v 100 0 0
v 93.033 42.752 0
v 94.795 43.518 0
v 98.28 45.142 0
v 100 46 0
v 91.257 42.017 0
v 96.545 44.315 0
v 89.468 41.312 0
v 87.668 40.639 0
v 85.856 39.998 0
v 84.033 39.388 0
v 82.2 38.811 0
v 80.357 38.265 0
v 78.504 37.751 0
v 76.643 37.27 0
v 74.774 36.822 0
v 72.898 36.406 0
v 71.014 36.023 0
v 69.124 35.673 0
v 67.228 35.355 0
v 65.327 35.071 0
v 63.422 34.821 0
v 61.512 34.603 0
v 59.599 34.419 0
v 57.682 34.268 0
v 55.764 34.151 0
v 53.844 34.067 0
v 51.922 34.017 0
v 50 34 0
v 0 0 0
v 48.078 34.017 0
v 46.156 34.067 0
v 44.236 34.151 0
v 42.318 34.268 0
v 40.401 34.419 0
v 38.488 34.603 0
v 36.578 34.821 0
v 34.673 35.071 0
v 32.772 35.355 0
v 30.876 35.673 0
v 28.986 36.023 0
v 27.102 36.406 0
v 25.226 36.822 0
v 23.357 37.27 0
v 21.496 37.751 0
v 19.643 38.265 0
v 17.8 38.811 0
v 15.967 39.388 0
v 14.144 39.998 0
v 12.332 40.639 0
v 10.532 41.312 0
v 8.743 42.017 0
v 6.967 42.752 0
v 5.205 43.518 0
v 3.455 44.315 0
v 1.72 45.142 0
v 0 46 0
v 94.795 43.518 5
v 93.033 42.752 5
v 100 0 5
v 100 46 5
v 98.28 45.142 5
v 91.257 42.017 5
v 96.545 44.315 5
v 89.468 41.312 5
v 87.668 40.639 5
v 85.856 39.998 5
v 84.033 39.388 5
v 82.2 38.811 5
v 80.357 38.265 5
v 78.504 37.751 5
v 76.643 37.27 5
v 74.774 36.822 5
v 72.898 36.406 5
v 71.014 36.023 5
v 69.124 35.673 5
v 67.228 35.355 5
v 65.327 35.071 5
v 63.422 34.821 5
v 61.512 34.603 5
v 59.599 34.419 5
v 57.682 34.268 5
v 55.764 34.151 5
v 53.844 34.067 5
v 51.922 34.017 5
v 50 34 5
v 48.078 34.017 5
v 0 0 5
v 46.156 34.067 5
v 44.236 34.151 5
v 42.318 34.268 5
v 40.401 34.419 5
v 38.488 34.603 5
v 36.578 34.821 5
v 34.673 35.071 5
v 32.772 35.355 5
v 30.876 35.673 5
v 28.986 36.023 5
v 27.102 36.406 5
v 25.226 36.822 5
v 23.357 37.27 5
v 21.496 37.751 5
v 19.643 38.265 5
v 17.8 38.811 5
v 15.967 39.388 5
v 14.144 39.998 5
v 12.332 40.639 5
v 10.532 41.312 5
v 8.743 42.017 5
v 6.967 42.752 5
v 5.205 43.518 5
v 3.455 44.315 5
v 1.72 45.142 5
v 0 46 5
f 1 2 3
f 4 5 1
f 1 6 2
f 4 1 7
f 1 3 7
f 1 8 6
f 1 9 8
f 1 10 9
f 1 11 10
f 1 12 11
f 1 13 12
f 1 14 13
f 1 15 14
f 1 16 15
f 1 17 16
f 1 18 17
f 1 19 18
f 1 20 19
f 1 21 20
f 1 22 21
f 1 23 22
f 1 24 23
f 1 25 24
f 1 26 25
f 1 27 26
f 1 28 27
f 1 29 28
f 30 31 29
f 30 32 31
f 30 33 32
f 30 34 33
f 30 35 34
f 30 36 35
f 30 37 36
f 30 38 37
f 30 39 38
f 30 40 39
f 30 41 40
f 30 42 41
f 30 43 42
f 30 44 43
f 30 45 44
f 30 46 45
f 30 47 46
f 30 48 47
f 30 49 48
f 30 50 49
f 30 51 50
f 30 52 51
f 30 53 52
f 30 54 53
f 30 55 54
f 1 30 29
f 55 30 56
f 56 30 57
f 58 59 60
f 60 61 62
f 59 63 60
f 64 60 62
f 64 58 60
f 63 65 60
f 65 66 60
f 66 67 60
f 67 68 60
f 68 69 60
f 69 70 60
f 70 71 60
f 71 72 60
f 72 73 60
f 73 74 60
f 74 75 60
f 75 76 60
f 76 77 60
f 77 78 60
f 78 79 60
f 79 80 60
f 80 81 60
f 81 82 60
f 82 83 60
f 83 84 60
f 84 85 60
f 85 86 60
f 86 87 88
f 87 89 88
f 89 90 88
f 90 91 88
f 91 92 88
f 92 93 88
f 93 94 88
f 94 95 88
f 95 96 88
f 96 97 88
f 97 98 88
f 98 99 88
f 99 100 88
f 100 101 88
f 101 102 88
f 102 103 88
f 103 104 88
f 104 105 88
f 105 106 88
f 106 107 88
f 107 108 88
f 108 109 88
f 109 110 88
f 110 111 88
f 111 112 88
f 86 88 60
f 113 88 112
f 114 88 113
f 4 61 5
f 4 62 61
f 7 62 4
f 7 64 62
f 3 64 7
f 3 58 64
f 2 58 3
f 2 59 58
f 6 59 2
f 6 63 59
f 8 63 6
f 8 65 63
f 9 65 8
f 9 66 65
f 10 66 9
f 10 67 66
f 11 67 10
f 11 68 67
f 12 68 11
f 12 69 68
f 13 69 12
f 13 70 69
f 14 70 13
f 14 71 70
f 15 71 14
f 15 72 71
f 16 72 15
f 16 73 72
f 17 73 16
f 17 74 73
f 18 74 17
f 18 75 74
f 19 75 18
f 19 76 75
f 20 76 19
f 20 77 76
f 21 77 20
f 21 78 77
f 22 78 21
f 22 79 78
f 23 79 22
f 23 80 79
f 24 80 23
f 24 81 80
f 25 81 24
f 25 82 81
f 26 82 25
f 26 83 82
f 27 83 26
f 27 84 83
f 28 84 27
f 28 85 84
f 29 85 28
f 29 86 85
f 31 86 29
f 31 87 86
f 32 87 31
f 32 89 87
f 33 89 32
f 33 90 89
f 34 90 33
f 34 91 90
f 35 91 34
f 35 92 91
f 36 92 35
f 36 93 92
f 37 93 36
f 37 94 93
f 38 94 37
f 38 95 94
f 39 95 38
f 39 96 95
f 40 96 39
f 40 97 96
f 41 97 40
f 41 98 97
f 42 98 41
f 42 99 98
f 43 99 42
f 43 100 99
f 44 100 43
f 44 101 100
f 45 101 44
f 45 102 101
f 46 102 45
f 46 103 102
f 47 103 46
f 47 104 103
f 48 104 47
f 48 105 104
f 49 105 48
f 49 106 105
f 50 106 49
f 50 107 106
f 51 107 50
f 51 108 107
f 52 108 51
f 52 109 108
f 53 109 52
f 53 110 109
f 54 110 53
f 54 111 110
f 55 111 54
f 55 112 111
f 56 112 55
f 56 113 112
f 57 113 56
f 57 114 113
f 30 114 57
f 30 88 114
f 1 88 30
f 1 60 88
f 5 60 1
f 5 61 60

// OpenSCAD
$fn = 32;

// ----------------------------------------------------------------------
// Arc profile plate: notch, 57 points
// ----------------------------------------------------------------------

// --- parameters (mm) ---
bar_l = 100;              // bar length, X
bar_w = 46;               // bar width, Y
notch_depth = 12;         // depth of the arc notch at mid-span
arc_r = 110.17;           // radius of the notch arc
arc_angle = 53.98;        // notch arc angle, degrees
arc_step = 1;             // sampling step of the notch arc, degrees
plate_t = 5;              // plate thickness, Z

profile = [[0, 0], [100, 0], [100, 46], [98.28, 45.142], [96.545, 44.315], [94.795, 43.518], [93.033, 42.752], [91.257, 42.017], [89.468, 41.312], [87.668, 40.639], [85.856, 39.998], [84.033, 39.388], [82.2, 38.811], [80.357, 38.265], [78.504, 37.751], [76.643, 37.27], [74.774, 36.822], [72.898, 36.406], [71.014, 36.023], [69.124, 35.673], [67.228, 35.355], [65.327, 35.071], [63.422, 34.821], [61.512, 34.603], [59.599, 34.419], [57.682, 34.268], [55.764, 34.151], [53.844, 34.067], [51.922, 34.017], [50, 34], [48.078, 34.017], [46.156, 34.067], [44.236, 34.151], [42.318, 34.268], [40.401, 34.419], [38.488, 34.603], [36.578, 34.821], [34.673, 35.071], [32.772, 35.355], [30.876, 35.673], [28.986, 36.023], [27.102, 36.406], [25.226, 36.822], [23.357, 37.27], [21.496, 37.751], [19.643, 38.265], [17.8, 38.811], [15.967, 39.388], [14.144, 39.998], [12.332, 40.639], [10.532, 41.312], [8.743, 42.017], [6.967, 42.752], [5.205, 43.518], [3.455, 44.315], [1.72, 45.142], [0, 46]];  // primary outline, 57 points, counter clockwise

// --- the one profile operation ---
linear_extrude(height = plate_t) polygon(points = profile);
